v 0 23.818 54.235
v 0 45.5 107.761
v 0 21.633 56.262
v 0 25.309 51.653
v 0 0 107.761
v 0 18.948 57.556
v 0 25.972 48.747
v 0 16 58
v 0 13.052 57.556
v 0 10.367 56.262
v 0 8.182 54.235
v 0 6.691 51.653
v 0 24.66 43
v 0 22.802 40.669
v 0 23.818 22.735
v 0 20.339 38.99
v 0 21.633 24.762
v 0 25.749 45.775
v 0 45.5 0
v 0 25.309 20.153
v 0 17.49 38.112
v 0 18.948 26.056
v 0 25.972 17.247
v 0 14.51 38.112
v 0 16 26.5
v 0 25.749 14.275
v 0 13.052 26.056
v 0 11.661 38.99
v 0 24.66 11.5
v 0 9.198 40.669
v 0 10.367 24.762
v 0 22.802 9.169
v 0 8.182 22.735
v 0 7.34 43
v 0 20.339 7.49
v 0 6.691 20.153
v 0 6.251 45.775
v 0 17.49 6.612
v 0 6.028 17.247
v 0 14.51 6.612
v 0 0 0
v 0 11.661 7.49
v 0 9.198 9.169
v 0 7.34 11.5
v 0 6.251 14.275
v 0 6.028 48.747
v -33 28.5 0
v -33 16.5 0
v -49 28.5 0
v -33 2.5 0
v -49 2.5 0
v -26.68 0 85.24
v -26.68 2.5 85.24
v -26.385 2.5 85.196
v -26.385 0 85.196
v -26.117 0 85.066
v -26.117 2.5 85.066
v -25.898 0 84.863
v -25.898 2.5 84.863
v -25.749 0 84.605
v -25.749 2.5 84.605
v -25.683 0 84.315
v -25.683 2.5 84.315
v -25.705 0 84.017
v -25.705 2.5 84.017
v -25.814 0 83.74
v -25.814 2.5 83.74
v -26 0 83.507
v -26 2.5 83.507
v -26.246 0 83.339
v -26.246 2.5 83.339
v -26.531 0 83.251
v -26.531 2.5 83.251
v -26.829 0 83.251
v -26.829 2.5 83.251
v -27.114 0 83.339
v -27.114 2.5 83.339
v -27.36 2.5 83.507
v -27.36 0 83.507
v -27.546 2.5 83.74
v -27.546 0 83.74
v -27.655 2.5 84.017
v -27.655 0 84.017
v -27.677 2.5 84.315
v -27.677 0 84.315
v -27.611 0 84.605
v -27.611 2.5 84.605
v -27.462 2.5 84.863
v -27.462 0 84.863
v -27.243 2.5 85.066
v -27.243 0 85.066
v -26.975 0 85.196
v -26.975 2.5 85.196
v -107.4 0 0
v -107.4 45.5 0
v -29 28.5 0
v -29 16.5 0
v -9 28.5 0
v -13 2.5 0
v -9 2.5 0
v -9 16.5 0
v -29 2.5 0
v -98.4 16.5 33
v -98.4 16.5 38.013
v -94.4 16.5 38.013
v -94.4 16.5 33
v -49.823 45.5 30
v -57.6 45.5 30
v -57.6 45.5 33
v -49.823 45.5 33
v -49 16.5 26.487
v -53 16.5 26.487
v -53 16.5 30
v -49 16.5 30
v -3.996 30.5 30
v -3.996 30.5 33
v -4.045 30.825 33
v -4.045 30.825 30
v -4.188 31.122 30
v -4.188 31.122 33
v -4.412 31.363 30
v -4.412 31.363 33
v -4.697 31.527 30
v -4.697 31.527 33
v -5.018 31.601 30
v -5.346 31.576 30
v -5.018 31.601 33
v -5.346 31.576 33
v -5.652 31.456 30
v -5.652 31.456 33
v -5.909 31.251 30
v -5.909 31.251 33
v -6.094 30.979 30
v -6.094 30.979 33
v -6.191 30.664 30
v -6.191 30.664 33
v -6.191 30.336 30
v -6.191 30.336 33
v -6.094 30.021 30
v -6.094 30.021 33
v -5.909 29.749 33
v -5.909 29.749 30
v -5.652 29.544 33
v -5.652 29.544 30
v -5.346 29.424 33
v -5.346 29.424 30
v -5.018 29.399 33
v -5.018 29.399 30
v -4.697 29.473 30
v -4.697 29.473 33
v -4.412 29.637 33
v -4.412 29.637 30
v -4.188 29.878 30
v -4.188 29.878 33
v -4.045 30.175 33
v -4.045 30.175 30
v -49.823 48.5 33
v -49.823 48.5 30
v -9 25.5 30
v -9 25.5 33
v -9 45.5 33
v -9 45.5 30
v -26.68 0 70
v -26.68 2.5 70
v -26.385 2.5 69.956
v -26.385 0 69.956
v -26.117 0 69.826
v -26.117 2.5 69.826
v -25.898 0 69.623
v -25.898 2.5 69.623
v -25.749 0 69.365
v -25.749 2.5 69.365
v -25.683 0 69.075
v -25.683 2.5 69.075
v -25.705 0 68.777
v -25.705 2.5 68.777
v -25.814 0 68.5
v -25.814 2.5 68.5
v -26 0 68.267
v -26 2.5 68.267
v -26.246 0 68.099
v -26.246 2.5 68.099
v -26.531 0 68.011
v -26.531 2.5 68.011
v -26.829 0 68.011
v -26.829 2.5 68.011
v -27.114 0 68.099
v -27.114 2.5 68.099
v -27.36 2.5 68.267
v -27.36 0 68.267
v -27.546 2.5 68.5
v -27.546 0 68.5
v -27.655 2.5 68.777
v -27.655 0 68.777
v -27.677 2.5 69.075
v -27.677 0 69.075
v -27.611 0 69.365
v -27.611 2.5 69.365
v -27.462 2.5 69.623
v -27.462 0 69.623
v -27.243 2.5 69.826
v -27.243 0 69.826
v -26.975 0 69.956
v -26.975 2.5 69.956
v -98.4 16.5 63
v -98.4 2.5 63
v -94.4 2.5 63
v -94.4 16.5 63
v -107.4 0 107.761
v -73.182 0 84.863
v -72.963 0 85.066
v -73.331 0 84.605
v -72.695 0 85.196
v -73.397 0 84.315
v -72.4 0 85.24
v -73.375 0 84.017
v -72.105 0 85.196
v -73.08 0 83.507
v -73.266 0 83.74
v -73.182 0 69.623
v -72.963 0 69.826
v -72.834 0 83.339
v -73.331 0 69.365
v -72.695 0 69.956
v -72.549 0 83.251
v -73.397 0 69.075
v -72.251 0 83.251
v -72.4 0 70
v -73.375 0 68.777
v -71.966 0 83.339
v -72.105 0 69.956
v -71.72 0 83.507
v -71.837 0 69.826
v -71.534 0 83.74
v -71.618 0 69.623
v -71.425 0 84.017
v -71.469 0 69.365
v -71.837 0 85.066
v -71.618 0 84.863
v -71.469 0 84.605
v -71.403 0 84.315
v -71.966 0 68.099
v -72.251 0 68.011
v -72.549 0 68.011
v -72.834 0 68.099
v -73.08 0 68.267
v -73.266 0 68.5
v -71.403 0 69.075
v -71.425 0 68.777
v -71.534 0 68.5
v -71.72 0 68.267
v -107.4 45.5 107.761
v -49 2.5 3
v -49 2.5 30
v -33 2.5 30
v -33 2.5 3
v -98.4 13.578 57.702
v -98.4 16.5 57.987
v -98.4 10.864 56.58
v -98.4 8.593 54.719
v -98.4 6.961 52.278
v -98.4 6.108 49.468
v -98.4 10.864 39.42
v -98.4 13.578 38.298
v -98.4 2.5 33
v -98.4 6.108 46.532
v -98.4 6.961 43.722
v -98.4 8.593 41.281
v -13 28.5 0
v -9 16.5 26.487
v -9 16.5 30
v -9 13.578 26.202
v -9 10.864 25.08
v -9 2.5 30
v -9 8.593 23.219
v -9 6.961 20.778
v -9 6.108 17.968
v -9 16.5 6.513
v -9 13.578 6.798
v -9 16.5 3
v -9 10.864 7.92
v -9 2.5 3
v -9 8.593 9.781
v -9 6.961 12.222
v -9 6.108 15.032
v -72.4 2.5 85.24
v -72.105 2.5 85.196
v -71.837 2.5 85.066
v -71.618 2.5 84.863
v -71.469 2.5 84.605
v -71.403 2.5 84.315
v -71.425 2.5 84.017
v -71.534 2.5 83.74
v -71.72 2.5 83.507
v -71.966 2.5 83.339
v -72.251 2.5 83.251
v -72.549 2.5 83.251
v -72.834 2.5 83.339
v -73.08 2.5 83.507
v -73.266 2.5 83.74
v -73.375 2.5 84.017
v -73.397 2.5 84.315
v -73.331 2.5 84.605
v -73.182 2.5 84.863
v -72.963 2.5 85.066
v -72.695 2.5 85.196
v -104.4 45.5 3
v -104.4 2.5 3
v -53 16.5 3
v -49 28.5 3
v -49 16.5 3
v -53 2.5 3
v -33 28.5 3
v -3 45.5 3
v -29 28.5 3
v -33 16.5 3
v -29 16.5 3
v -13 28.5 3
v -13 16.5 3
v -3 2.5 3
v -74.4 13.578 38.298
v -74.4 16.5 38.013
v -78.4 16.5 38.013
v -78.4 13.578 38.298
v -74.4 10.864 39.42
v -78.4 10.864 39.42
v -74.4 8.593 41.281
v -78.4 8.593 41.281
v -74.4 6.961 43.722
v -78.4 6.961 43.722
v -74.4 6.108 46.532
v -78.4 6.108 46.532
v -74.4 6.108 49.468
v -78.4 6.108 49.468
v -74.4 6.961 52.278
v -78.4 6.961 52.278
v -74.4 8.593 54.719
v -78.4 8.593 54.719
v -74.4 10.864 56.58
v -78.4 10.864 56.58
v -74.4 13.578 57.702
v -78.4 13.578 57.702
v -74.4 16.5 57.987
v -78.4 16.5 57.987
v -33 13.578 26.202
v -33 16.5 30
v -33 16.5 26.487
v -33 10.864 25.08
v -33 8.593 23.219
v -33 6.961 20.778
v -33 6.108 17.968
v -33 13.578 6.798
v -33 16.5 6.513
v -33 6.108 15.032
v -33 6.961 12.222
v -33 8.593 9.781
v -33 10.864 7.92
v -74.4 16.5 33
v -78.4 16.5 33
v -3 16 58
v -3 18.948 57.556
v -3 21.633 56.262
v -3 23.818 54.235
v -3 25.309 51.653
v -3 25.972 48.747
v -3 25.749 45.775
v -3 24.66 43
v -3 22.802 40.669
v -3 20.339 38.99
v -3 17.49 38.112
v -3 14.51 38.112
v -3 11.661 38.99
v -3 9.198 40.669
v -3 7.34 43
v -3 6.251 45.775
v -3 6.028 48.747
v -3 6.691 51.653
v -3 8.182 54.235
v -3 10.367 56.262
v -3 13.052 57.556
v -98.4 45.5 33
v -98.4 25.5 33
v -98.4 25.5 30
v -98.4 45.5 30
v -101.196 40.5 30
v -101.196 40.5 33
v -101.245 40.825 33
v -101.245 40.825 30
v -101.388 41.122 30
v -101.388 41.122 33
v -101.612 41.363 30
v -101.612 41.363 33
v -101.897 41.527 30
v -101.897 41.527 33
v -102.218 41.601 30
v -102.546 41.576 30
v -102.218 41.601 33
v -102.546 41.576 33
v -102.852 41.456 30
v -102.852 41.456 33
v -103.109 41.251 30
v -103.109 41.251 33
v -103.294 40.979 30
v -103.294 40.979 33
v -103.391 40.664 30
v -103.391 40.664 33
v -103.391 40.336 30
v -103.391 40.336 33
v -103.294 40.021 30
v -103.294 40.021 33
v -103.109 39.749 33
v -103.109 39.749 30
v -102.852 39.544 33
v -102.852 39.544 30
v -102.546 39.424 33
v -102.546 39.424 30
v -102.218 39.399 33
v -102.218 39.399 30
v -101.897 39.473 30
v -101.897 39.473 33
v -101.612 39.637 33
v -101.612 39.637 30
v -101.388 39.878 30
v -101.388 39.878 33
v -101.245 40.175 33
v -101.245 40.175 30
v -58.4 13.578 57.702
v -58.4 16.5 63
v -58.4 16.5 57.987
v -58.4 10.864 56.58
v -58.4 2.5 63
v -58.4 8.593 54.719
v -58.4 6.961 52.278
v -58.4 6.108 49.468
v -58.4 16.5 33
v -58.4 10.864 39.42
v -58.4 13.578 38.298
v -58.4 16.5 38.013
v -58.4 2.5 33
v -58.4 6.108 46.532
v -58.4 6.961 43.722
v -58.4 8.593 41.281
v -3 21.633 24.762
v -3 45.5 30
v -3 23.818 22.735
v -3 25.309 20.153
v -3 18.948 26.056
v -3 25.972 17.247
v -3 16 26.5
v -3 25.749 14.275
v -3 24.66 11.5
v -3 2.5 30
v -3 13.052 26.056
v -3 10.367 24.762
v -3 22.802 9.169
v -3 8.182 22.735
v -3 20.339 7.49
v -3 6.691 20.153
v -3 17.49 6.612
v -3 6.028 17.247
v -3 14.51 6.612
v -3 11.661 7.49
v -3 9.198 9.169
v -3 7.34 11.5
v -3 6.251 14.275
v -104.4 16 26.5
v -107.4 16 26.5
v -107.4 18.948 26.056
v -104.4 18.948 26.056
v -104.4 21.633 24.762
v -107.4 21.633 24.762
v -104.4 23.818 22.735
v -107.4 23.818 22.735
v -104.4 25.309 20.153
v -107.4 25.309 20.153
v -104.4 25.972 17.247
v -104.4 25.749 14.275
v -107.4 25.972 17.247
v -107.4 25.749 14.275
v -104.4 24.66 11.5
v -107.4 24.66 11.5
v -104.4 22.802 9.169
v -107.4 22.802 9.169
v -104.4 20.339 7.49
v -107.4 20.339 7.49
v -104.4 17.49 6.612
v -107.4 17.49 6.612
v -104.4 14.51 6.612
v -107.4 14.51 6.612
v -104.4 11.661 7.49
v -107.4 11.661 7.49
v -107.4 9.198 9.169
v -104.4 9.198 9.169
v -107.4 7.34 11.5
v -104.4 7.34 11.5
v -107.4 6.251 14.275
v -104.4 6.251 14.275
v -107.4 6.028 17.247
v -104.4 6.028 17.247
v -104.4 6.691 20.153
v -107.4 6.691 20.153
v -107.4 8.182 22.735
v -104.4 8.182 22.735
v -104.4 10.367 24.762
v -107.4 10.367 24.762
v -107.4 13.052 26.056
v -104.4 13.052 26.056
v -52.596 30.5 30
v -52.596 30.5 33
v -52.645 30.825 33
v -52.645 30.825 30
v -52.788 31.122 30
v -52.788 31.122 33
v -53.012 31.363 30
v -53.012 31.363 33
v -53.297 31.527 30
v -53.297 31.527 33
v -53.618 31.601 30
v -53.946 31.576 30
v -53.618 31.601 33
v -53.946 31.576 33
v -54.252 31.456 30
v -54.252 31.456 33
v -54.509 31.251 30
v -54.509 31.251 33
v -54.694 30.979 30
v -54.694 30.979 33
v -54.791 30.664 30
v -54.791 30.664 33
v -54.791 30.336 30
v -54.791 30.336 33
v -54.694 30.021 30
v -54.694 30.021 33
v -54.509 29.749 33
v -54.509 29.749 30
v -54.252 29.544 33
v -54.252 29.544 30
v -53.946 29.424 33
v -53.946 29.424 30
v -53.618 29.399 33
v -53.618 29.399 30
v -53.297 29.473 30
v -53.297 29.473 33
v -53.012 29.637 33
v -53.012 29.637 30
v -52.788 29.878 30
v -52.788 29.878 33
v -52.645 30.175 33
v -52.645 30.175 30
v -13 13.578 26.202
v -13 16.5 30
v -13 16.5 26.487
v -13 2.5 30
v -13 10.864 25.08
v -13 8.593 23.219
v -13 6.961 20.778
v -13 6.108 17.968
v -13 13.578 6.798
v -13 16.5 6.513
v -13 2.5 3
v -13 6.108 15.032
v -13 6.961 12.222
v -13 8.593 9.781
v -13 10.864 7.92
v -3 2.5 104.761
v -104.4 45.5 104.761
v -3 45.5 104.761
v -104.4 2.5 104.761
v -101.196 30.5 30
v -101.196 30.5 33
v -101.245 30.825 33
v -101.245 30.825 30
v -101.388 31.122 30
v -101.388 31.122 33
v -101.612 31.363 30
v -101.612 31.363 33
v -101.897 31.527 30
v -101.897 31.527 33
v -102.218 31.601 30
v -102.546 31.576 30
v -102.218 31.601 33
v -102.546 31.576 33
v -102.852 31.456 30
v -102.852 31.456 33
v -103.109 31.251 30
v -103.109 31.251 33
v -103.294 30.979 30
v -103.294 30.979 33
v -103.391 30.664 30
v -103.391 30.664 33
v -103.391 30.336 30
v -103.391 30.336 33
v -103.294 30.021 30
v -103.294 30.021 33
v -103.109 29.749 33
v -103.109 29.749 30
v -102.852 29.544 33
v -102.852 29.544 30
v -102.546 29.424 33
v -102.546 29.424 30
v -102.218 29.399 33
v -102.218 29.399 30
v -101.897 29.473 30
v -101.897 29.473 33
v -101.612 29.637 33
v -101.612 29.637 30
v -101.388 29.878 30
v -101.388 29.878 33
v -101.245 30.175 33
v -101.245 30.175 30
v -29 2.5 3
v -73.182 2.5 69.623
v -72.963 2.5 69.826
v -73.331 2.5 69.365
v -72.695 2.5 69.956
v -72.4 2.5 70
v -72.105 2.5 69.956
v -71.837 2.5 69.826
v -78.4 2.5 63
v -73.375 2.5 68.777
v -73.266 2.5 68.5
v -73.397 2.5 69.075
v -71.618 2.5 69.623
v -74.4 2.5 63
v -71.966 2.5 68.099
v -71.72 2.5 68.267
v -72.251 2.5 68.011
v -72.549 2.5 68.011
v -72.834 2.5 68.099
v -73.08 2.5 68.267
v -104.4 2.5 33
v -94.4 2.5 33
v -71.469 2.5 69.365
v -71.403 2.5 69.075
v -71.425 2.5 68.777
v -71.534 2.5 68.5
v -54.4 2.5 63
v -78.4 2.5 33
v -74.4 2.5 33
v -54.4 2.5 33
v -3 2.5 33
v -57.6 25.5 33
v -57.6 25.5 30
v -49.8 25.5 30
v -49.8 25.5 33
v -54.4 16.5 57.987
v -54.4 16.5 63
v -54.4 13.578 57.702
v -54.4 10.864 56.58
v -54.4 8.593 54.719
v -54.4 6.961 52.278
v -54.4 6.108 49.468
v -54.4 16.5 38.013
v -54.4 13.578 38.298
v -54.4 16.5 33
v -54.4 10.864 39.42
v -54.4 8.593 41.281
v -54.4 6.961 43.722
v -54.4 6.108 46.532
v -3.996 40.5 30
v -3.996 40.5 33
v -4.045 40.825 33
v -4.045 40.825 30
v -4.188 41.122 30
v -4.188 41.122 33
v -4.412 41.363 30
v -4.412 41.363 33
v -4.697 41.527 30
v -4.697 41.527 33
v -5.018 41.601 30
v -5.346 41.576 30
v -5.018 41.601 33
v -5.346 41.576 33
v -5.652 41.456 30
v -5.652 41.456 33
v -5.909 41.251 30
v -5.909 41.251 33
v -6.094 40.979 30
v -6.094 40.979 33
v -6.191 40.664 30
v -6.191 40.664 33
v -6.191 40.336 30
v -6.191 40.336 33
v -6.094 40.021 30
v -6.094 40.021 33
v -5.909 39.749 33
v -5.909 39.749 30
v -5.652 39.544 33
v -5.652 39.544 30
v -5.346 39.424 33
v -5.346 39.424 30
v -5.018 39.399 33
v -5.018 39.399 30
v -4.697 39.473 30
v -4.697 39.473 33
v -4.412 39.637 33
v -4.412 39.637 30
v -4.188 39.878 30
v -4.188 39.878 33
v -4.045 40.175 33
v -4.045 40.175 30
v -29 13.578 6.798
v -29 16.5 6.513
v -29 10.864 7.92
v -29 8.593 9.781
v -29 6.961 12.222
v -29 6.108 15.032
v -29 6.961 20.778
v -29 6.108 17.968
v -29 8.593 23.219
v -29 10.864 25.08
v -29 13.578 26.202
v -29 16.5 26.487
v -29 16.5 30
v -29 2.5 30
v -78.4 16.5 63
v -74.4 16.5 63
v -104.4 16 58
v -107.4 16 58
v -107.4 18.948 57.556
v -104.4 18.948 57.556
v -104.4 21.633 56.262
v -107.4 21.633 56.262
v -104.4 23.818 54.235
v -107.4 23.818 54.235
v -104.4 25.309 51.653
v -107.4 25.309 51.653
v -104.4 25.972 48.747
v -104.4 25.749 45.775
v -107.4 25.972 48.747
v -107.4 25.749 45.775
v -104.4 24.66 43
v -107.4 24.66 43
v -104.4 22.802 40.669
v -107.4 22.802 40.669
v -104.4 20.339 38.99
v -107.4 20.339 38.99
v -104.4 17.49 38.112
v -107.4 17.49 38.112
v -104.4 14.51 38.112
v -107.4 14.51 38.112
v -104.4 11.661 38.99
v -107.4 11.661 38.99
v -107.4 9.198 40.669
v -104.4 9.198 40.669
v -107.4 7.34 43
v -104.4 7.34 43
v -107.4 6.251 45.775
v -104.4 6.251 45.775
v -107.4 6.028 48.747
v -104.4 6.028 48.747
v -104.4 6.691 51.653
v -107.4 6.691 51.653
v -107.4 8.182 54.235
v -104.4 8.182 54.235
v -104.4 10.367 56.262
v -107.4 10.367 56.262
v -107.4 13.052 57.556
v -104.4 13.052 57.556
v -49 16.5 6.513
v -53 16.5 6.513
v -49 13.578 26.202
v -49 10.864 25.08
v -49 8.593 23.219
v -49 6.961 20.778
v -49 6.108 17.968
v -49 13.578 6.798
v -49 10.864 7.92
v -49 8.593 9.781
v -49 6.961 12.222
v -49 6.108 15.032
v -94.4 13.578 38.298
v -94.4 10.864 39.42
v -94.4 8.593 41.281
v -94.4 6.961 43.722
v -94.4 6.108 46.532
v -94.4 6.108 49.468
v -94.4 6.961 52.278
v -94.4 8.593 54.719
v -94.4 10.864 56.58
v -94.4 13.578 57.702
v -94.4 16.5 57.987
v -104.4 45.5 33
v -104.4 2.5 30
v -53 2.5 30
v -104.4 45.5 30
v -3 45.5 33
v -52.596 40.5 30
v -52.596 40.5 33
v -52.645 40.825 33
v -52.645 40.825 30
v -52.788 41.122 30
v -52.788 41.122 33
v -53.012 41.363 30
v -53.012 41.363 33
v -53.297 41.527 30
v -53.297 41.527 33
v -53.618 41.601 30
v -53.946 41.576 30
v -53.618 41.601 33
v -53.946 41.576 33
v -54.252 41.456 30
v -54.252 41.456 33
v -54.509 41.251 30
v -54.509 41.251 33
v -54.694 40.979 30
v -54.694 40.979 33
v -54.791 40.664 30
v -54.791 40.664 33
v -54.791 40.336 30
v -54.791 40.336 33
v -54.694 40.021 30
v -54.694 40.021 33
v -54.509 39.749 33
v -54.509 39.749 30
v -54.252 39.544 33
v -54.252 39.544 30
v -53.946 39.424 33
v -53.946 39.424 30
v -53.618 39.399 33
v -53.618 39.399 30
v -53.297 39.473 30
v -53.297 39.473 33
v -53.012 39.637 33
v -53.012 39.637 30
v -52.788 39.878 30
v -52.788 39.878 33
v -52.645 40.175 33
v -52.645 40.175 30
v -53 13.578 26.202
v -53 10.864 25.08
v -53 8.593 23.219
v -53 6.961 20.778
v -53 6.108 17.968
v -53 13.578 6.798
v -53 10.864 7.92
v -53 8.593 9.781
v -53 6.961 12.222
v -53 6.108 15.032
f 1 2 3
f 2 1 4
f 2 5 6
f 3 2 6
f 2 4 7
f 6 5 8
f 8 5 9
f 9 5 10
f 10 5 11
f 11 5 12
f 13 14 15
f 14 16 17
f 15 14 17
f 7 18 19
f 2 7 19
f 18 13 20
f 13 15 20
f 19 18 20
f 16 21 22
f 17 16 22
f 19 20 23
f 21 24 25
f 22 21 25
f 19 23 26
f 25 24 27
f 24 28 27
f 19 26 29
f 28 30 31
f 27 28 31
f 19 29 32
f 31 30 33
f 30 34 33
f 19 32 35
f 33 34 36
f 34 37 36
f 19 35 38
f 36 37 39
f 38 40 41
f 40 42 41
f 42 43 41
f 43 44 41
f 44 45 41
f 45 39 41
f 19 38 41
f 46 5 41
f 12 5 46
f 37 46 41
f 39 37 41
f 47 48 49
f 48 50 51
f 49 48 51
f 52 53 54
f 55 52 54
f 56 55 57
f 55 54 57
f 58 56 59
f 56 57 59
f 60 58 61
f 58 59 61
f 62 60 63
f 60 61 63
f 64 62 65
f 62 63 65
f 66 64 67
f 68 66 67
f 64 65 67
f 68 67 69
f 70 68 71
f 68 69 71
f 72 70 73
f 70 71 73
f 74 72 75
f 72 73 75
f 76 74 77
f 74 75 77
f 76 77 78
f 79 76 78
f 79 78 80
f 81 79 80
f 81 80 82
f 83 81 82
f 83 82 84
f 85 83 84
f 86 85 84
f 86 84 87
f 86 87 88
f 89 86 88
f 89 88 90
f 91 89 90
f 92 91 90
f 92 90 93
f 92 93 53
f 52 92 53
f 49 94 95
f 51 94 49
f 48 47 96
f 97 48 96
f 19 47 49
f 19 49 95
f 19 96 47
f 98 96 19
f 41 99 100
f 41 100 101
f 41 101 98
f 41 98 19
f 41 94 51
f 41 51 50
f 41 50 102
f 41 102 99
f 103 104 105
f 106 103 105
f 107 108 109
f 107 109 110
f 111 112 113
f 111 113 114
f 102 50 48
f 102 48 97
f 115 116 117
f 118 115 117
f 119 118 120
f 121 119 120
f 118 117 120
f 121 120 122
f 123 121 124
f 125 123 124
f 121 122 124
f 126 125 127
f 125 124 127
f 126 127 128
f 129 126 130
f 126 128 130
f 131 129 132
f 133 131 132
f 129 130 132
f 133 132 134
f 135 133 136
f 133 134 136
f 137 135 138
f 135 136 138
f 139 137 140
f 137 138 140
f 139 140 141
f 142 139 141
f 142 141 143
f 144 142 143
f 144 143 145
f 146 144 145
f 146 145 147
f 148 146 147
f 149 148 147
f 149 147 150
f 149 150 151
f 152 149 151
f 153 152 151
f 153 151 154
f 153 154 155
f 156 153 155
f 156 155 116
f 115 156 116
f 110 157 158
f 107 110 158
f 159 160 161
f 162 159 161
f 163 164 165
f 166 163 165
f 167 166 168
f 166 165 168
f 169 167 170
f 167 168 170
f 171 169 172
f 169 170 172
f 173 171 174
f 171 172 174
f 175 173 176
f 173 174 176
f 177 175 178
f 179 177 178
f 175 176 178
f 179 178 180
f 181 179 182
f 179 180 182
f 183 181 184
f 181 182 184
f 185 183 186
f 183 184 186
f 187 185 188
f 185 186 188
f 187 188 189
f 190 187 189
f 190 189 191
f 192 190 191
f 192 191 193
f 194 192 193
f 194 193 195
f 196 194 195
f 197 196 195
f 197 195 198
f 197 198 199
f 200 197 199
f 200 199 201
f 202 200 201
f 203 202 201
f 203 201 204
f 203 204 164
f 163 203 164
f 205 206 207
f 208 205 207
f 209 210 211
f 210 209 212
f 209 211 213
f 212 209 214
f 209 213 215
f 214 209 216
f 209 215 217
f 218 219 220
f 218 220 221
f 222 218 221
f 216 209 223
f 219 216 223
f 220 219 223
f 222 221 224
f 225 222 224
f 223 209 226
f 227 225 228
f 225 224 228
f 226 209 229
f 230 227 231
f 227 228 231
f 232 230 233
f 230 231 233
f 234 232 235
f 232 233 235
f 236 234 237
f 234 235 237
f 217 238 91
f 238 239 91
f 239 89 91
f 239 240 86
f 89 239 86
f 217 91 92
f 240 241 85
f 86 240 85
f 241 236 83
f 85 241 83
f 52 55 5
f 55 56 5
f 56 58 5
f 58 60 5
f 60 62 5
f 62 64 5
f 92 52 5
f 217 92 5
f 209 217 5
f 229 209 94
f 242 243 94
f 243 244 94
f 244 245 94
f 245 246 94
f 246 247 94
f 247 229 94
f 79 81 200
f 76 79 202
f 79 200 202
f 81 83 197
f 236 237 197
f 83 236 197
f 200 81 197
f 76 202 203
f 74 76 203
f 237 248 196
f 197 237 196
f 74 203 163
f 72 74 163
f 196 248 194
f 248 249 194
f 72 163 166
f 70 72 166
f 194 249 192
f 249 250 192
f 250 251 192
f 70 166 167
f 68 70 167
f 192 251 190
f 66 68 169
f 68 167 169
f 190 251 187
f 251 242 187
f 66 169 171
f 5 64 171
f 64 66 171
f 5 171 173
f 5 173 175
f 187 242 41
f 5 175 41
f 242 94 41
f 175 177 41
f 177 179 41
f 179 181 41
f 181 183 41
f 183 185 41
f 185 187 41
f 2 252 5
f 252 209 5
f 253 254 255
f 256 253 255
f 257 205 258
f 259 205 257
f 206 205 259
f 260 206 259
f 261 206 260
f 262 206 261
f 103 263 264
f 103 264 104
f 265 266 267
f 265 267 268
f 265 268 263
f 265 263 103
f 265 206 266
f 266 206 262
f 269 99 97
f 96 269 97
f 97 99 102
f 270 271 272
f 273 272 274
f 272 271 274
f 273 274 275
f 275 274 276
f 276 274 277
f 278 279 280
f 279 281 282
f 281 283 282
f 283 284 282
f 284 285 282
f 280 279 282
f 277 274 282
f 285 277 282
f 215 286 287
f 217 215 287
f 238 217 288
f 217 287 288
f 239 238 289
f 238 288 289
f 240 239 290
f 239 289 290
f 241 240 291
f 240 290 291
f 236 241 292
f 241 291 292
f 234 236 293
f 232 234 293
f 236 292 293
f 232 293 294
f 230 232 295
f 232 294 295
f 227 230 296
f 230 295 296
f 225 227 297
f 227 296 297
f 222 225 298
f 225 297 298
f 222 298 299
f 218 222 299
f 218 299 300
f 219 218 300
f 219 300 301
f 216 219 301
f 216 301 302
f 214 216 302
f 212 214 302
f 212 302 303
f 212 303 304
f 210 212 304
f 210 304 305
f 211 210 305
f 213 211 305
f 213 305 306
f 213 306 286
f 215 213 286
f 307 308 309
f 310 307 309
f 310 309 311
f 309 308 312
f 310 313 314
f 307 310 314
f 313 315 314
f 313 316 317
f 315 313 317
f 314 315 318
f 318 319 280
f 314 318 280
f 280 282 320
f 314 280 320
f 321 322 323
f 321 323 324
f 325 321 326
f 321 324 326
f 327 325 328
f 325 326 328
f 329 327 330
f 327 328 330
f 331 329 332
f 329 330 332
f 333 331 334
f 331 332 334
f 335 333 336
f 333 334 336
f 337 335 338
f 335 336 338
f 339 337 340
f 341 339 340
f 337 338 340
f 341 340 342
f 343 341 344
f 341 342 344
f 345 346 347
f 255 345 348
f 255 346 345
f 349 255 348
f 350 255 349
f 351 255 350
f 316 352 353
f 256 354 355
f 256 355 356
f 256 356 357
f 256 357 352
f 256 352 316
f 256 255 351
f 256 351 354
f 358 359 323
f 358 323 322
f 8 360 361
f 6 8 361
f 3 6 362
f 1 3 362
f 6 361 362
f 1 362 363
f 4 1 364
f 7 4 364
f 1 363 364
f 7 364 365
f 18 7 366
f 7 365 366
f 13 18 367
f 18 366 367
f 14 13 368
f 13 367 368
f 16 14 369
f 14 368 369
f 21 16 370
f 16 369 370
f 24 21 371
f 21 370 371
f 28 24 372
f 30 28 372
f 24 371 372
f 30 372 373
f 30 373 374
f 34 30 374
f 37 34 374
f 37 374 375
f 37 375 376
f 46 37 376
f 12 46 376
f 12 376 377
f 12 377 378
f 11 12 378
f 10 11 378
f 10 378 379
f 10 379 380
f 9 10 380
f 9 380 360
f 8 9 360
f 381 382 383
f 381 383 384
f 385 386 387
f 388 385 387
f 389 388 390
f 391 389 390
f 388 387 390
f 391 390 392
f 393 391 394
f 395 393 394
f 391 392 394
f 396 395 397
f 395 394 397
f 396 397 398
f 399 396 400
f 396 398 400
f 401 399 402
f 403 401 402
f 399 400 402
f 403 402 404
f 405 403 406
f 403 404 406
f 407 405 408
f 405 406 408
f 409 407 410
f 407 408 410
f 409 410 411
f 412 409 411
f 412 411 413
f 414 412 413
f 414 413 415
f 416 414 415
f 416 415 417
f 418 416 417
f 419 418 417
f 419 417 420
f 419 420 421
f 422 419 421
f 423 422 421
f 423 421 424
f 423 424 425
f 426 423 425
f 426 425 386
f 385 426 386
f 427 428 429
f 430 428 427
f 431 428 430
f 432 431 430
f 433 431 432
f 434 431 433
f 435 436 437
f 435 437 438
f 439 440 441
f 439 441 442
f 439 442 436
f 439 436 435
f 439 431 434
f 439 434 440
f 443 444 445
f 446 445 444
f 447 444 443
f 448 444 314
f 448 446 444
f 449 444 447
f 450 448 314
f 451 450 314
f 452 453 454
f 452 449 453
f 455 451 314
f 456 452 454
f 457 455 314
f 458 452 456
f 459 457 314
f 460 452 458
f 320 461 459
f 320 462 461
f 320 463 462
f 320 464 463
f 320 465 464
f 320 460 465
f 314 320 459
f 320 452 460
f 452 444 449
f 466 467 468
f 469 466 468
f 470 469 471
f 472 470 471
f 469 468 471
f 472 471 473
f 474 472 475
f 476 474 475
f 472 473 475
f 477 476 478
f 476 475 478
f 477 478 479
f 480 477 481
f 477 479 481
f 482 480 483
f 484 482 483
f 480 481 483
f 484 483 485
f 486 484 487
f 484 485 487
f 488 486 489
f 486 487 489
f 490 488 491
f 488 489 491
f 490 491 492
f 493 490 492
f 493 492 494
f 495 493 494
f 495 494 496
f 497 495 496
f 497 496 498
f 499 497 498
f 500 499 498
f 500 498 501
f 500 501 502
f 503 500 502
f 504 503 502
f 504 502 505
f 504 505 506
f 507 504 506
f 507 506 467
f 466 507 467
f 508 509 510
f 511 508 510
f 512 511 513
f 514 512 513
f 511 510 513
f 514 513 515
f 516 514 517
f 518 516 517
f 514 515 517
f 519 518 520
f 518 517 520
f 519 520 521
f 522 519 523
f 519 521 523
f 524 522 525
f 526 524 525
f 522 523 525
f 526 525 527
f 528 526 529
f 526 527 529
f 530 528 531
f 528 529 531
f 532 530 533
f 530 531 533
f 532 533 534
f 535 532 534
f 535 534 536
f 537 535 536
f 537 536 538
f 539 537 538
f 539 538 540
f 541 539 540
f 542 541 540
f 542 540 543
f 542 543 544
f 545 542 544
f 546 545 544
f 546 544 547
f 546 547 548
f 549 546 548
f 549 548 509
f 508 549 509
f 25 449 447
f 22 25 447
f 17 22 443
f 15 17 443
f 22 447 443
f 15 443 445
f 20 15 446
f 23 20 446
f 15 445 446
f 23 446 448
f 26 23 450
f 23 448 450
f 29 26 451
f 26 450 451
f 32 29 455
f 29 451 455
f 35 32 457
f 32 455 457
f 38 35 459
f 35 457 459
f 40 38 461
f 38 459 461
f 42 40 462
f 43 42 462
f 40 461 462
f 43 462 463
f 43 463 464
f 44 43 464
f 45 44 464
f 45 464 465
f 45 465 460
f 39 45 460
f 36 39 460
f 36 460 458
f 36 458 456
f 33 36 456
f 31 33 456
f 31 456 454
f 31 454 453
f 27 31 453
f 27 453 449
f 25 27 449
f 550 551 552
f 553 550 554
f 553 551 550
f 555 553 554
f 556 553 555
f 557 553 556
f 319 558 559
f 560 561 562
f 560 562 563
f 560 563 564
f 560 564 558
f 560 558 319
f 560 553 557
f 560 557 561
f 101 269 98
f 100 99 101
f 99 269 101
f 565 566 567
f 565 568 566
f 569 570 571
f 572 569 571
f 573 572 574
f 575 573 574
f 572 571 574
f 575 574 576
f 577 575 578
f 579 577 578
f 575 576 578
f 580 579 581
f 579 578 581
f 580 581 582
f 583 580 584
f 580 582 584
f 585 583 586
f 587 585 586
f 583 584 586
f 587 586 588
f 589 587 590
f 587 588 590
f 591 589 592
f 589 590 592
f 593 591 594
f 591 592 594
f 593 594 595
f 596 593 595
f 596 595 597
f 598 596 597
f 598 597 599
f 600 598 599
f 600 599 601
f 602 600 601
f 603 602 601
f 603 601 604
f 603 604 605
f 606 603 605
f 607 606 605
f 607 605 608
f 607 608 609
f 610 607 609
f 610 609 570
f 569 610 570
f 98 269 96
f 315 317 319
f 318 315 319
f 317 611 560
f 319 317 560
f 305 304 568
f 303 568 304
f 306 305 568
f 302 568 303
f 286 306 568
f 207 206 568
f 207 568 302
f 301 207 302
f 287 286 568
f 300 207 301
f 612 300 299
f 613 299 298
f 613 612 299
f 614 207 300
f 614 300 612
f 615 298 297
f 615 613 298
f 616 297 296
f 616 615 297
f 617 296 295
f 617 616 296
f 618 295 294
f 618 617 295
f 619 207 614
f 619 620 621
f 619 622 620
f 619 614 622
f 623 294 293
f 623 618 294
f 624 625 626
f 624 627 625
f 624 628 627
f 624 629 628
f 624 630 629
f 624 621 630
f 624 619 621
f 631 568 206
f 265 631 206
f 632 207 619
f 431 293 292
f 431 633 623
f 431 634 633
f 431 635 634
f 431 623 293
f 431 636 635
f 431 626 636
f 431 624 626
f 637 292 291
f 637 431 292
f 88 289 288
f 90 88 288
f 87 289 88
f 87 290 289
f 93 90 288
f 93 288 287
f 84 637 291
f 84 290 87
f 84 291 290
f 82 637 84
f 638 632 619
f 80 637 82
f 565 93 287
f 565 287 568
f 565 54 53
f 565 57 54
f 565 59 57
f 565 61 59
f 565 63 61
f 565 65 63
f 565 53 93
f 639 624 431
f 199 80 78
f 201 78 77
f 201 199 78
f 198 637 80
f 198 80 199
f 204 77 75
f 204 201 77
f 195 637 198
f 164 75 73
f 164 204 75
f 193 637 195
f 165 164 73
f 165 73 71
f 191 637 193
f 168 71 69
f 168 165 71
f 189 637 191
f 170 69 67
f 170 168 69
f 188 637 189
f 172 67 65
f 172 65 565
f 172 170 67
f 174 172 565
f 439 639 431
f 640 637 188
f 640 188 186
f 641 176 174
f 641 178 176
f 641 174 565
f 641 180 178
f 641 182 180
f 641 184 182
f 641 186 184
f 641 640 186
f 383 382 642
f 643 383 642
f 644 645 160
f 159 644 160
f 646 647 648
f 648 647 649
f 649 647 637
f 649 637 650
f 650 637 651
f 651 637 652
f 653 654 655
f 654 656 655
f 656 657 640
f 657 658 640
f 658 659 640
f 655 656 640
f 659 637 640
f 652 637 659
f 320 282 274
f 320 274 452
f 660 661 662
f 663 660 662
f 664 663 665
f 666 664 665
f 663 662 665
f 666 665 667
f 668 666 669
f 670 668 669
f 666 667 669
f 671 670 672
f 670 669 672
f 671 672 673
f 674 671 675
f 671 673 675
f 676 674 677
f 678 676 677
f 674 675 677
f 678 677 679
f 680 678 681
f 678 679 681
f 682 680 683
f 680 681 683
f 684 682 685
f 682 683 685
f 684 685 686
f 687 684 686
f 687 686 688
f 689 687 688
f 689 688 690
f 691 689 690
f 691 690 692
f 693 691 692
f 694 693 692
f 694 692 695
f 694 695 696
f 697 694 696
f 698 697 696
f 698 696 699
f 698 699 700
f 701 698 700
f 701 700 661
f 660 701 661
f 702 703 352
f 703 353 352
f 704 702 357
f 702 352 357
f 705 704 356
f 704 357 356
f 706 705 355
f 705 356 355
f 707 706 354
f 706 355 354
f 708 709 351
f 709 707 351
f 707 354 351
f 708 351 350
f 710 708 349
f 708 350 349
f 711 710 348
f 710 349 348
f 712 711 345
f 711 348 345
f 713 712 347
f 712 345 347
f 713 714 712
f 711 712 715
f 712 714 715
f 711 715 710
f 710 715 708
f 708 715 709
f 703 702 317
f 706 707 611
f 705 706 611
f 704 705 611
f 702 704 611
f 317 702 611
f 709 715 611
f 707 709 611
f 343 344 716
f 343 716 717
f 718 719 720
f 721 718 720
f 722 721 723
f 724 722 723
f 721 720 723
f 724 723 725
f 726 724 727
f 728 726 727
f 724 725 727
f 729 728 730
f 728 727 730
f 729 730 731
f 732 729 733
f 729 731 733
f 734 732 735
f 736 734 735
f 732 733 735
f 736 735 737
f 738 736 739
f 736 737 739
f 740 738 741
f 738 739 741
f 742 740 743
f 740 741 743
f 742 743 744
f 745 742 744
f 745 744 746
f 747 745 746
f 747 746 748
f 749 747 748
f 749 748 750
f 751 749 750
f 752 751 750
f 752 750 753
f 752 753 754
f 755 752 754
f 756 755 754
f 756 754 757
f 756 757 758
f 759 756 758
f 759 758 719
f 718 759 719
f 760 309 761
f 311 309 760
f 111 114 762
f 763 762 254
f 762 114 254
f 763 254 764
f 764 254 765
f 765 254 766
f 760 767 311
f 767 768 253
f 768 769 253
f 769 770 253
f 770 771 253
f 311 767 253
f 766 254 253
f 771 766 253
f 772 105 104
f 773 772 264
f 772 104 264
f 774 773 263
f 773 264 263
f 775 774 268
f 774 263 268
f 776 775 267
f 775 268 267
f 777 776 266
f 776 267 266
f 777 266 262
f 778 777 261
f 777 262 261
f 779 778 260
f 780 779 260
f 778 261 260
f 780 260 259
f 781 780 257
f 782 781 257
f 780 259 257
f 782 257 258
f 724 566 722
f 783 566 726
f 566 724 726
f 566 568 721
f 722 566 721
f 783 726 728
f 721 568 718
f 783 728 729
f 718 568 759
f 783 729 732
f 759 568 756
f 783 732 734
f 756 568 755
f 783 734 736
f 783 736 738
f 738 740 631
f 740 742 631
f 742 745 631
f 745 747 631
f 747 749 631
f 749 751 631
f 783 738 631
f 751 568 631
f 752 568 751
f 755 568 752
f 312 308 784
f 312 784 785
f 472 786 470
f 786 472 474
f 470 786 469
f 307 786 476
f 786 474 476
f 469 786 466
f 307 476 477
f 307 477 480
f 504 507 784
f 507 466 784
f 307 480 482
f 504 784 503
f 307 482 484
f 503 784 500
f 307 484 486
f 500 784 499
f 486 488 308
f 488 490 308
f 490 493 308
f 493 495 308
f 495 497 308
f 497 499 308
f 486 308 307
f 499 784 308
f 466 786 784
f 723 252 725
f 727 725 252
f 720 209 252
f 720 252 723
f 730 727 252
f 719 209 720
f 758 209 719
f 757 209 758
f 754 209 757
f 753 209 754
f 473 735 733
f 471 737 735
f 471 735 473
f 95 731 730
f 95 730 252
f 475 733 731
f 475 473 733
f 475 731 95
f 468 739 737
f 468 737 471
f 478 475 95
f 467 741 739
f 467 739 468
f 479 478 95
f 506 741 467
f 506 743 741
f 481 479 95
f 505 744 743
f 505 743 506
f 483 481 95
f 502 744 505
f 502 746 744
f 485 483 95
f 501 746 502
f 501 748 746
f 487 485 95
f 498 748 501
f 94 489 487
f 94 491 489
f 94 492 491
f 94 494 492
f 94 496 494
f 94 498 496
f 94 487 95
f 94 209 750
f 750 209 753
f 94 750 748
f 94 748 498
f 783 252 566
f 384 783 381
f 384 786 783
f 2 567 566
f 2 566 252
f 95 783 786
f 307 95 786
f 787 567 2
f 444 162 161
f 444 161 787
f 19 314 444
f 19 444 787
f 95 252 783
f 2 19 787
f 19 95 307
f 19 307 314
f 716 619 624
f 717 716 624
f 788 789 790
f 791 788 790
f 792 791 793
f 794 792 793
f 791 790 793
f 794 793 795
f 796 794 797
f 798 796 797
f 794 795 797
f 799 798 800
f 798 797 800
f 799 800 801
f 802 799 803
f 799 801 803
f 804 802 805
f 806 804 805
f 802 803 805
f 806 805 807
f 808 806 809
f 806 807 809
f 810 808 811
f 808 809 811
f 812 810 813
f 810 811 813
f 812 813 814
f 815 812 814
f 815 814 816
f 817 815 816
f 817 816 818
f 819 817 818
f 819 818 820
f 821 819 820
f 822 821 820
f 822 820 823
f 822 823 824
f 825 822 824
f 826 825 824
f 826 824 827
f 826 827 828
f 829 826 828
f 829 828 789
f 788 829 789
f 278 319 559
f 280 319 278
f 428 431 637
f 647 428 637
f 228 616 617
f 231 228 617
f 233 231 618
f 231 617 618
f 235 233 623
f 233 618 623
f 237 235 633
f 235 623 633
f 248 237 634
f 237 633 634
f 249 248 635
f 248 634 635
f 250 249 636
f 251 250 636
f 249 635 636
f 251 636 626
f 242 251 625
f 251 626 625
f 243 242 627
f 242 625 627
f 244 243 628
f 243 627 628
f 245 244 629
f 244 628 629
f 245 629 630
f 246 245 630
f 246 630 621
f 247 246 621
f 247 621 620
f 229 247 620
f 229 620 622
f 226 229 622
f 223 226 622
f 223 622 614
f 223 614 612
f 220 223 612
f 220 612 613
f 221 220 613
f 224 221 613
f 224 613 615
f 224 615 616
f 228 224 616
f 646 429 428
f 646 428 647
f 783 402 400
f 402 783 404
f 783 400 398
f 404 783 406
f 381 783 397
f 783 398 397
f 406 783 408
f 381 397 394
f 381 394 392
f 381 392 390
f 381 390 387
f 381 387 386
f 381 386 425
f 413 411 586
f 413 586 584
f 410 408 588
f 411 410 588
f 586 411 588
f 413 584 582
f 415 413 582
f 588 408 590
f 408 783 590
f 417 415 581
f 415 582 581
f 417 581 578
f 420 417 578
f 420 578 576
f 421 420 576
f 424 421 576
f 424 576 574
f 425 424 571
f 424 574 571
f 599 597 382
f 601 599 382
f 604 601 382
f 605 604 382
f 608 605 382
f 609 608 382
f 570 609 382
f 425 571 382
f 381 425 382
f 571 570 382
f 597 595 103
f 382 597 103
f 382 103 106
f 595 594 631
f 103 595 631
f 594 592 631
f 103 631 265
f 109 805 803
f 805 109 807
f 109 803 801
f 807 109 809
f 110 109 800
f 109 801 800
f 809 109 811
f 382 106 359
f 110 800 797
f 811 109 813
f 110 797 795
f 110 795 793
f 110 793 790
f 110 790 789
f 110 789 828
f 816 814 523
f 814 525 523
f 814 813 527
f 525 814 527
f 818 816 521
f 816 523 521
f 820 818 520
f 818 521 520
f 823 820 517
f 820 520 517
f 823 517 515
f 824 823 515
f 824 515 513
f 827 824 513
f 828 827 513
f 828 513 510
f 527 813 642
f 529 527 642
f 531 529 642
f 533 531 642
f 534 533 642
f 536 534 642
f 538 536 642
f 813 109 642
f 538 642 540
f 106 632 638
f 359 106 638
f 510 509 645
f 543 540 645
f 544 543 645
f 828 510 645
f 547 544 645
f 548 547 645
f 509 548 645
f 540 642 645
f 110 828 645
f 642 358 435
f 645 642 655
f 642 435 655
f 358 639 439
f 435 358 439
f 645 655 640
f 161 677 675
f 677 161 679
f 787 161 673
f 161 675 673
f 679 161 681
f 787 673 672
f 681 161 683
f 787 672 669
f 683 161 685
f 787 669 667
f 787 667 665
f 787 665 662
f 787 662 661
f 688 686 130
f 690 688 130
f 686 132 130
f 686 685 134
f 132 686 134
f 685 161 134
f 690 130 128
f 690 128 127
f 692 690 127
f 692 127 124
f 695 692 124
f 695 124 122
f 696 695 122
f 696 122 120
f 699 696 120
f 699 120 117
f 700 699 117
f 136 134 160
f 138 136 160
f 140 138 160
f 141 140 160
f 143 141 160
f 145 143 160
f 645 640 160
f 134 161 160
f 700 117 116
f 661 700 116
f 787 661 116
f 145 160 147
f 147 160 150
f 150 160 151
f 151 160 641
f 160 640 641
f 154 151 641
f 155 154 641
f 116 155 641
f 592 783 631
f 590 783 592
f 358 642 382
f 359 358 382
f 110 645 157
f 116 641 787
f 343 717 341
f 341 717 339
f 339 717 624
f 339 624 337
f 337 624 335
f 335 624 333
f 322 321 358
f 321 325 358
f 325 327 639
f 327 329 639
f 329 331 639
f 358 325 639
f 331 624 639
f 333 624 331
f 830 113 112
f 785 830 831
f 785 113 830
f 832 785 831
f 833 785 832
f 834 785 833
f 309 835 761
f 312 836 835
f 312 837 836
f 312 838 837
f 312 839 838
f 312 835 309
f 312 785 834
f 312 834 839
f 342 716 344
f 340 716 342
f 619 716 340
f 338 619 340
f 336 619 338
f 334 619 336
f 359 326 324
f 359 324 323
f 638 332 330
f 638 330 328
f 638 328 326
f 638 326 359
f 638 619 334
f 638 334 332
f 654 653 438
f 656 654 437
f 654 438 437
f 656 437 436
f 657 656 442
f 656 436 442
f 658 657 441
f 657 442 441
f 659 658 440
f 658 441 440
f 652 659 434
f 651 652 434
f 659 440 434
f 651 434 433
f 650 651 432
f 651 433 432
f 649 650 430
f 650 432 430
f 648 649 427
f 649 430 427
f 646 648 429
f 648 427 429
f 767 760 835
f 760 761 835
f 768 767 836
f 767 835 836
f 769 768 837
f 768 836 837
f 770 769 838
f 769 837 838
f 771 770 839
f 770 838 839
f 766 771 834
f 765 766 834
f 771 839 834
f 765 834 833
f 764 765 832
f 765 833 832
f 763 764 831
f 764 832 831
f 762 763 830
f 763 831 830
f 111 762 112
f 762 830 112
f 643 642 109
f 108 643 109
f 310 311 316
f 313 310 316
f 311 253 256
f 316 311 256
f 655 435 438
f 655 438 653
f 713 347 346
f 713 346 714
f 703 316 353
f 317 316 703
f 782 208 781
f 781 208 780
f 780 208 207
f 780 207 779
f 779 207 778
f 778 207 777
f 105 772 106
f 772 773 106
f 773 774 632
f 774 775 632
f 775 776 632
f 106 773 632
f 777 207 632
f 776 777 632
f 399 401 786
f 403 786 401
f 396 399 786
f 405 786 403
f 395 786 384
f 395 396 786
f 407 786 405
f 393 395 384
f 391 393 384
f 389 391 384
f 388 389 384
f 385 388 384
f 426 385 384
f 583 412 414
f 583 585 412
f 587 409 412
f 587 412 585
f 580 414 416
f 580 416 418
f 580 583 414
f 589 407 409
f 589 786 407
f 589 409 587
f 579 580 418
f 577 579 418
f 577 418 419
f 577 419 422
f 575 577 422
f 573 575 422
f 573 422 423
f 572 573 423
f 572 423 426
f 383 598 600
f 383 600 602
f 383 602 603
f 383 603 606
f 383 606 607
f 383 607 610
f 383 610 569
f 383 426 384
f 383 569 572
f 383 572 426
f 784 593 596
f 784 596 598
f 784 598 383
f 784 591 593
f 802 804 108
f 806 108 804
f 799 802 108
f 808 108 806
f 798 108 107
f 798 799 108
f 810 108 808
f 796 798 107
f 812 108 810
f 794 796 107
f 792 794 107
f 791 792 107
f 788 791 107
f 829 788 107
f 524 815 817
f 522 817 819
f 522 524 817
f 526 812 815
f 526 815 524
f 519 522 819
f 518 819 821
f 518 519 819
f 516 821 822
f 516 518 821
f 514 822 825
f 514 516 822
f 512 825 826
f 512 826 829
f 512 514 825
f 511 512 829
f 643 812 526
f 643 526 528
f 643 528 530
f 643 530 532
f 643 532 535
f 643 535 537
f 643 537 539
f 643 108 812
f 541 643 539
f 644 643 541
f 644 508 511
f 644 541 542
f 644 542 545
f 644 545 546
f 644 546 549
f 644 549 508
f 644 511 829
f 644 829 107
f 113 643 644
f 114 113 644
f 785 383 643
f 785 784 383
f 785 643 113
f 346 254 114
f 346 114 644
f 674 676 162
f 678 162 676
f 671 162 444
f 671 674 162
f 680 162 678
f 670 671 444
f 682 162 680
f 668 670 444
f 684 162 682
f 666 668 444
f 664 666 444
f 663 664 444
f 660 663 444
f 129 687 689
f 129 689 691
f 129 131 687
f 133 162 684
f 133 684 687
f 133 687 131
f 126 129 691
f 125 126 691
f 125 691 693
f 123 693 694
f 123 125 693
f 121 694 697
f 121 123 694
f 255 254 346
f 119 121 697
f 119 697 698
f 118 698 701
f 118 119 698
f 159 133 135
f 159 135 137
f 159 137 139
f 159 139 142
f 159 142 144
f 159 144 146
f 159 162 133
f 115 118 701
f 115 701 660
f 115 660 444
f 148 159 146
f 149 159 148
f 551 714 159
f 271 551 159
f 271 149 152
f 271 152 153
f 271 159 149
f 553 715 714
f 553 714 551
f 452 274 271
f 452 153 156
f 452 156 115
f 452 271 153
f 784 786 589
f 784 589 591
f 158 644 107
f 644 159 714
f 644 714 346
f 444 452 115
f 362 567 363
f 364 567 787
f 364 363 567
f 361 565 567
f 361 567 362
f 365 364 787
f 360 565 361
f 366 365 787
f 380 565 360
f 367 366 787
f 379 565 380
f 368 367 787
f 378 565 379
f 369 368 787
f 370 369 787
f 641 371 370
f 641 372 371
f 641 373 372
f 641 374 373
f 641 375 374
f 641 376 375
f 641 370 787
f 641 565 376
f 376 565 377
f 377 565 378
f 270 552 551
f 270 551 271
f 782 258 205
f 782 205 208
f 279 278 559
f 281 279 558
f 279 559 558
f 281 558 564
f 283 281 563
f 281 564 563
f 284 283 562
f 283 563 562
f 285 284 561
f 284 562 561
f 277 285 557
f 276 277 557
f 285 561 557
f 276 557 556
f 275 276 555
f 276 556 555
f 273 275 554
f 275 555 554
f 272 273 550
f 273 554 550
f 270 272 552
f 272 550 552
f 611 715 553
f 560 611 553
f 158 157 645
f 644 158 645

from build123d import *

# Parameters (mm, degrees)
SKETCH3_W           = 107.4
SKETCH3_H           = 136.761182254
BOSS_EXTRUDE2_DEPTH = 2.5
SKETCH4_W           = 4
SKETCH4_H           = 30
BOSS_EXTRUDE3_DEPTH = 14
BOSS_EXTRUDE5_DEPTH = 26
SKETCH8_R           = 1
CUT_EXTRUDE3_DEPTH  = 176.824858798
SKETCH10_W          = 101.4
SKETCH10_H          = 3
BOSS_EXTRUDE6_DEPTH = 46
SKETCH14_W          = 107.4
SKETCH14_H          = 29
CUT_EXTRUDE7_DEPTH  = 181.528753863
SKETCH15_W          = 40.8
SKETCH15_H          = 23
SKETCH15_R          = 1.103593158
CUT_EXTRUDE11_DEPTH = 14
SKETCH17_R          = 10
CUT_EXTRUDE12_DEPTH = 160.685573552
SKETCH18_W          = 101.4
SKETCH18_H          = 3
BOSS_EXTRUDE7_DEPTH = 26
SKETCH19_W          = 4
SKETCH19_H          = 3
SKETCH19_H_2        = 3.000000485
BOSS_EXTRUDE8_DEPTH = 12
SKETCH20_W          = 6
SKETCH20_H          = 3
SKETCH20_W_2        = 7.776734501
CUT_EXTRUDE13_DEPTH = 3
SKETCH21_W          = 107.4
SKETCH21_H          = 107.761182254
SKETCH21_W_2        = 101.4
SKETCH21_H_2        = 101.761182254
BOSS_EXTRUDE9_DEPTH = 17


with BuildPart() as part:
    # Sketch3 → Boss-Extrude2 (new body)
    with BuildSketch(Plane(origin=(0, 0, 0), x_dir=(1, 0, 0), z_dir=(0, 1, 0))):
        with Locations((-53.7, -68.380591127)):
            Rectangle(SKETCH3_W, SKETCH3_H)
    extrude(amount=BOSS_EXTRUDE2_DEPTH)

    # Sketch4 → Boss-Extrude3 (add)
    with BuildSketch(Plane(origin=(0, 2.5, 0), x_dir=(1, 0, 0), z_dir=(0, 1, 0))):
        with Locations((-31, -14.999999758)):
            Rectangle(SKETCH4_W, SKETCH4_H)
        with Locations((-51, -15)):
            Rectangle(SKETCH4_W, SKETCH4_H)
        with Locations((-11, -14.999999515)):
            Rectangle(SKETCH4_W, SKETCH4_H)
        with Locations((-76.4, -48.000000242)):
            Rectangle(SKETCH4_W, SKETCH4_H)
        with Locations((-96.4, -48.000000485)):
            Rectangle(SKETCH4_W, SKETCH4_H)
        with Locations((-56.4, -48)):
            Rectangle(SKETCH4_W, SKETCH4_H)
    extrude(amount=BOSS_EXTRUDE3_DEPTH)

    # Sketch7 → Boss-Extrude5 (add)
    with BuildSketch(Plane(origin=(0, 2.5, 0), x_dir=(1, 0, 0), z_dir=(0, 1, 0))):
        Polygon((-9, -3), (-3, -3), (-3, -133.761182254), (-104.4, -133.761182254), (-104.4, -3), (-53, -3), (-53, 0), (-107.4, 0), (-107.4, -136.761182254), (0, -136.761182254), (0, 0), (-9, 0), align=None)
        Polygon((-28.999999909, -3), (-12.999999909, -2.999999515), (-13, 4.85e-07), (-29, 0), align=None)
        Polygon((-48.999999955, -3), (-32.999999955, -2.999999758), (-33, 2.42e-07), (-49, 0), align=None)
    extrude(amount=BOSS_EXTRUDE5_DEPTH)

    # Sketch8 → Cut-Extrude3 (cut, through all)
    with BuildSketch(Plane(origin=(0, 2.5, 0), x_dir=(1, 0, 0), z_dir=(0, 1, 0))):
        with Locations((-72.4, -69.000000485)):
            Circle(SKETCH8_R)
        with Locations((-26.68, -69.000000485)):
            Circle(SKETCH8_R)
        with Locations((-26.68, -84.240000485)):
            Circle(SKETCH8_R)
        with Locations((-72.4, -84.240000485)):
            Circle(SKETCH8_R)
    extrude(amount=-CUT_EXTRUDE3_DEPTH, mode=Mode.SUBTRACT)


with BuildPart() as boss_extrude6_tool:
    # Sketch10 → Boss-Extrude6 (new body)
    with BuildSketch(Plane(origin=(0, 2.5, 0), x_dir=(1, 0, 0), z_dir=(0, 1, 0))):
        with Locations((-53.7, -31.499999515)):
            Rectangle(SKETCH10_W, SKETCH10_H)
    extrude(amount=BOSS_EXTRUDE6_DEPTH)


with BuildPart() as part_1:
    add(part.part)


with BuildPart() as part_2:
    # Boss-Extrude6: joined with boss_extrude6_tool
    add(part_1.part.fuse(boss_extrude6_tool.part, tol=0.00001))

    # Sketch14 → Cut-Extrude7 (cut, through all)
    with BuildSketch(Plane.XZ):
        with Locations((-53.7, 122.261182254)):
            Rectangle(SKETCH14_W, SKETCH14_H)
    extrude(amount=-CUT_EXTRUDE7_DEPTH, mode=Mode.SUBTRACT)

    # Sketch15 → Cut-Extrude11 (cut)
    with BuildSketch(Plane.XY.offset(32.999999515)):
        with Locations((-78, 37)):
            Rectangle(SKETCH15_W, SKETCH15_H)
        Polygon((-49.823265499, 48.5), (-49.8, 25.5), (-9, 25.5), (-9, 48.5), align=None)
        with Locations((-102.3, 30.5)):
            Circle(SKETCH15_R)
        with Locations((-102.3, 40.5)):
            Circle(SKETCH15_R)
        with Locations((-53.7, 30.5)):
            Circle(SKETCH15_R)
        with Locations((-53.7, 40.5)):
            Circle(SKETCH15_R)
        with Locations((-5.1, 40.5)):
            Circle(SKETCH15_R)
        with Locations((-5.1, 30.5)):
            Circle(SKETCH15_R)
    extrude(amount=-CUT_EXTRUDE11_DEPTH, mode=Mode.SUBTRACT)

    # Sketch17 → Cut-Extrude12 (cut, through all)
    with BuildSketch(Plane.ZY.offset(107.4)):
        with Locations((16.5, 16)):
            Circle(SKETCH17_R)
        with Locations((48, 16)):
            Circle(SKETCH17_R)
    extrude(amount=-CUT_EXTRUDE12_DEPTH, mode=Mode.SUBTRACT)

    # Sketch18 → Boss-Extrude7 (add)
    with BuildSketch(Plane(origin=(0, 2.5, 0), x_dir=(1, 0, 0), z_dir=(0, 1, 0))):
        with Locations((-53.7, -106.261182254)):
            Rectangle(SKETCH18_W, SKETCH18_H)
    extrude(amount=BOSS_EXTRUDE7_DEPTH)

    # Sketch19 → Boss-Extrude8 (add)
    with BuildSketch(Plane(origin=(0, 16.5, 0), x_dir=(1, 0, 0), z_dir=(0, 1, 0))):
        with Locations((-51, -1.5)):
            Rectangle(SKETCH19_W, SKETCH19_H)
        with Locations((-31, -1.5)):
            Rectangle(SKETCH19_W, SKETCH19_H)
        with Locations((-11, -1.499999757)):
            Rectangle(SKETCH19_W, SKETCH19_H_2)
    extrude(amount=BOSS_EXTRUDE8_DEPTH)

    # Sketch20 → Cut-Extrude13 (cut)
    with BuildSketch(Plane(origin=(0, 48.5, 0), x_dir=(1, 0, 0), z_dir=(0, 1, 0))):
        with Locations((-6, -31.499999515)):
            Rectangle(SKETCH20_W, SKETCH20_H)
        with Locations((-53.711632749, -31.499999515)):
            Rectangle(SKETCH20_W_2, SKETCH20_H)
        with Locations((-101.4, -31.499999515)):
            Rectangle(SKETCH20_W, SKETCH20_H)
    extrude(amount=-CUT_EXTRUDE13_DEPTH, mode=Mode.SUBTRACT)

    # Sketch21 → Boss-Extrude9 (add)
    with BuildSketch(Plane(origin=(0, 28.5, 0), x_dir=(1, 0, 0), z_dir=(0, 1, 0))):
        with Locations((-53.7, -53.880591127)):
            Rectangle(SKETCH21_W, SKETCH21_H)
        with Locations((-53.7, -53.880591127)):
            Rectangle(SKETCH21_W_2, SKETCH21_H_2, mode=Mode.SUBTRACT)
    extrude(amount=BOSS_EXTRUDE9_DEPTH)


solid = part_2.part
